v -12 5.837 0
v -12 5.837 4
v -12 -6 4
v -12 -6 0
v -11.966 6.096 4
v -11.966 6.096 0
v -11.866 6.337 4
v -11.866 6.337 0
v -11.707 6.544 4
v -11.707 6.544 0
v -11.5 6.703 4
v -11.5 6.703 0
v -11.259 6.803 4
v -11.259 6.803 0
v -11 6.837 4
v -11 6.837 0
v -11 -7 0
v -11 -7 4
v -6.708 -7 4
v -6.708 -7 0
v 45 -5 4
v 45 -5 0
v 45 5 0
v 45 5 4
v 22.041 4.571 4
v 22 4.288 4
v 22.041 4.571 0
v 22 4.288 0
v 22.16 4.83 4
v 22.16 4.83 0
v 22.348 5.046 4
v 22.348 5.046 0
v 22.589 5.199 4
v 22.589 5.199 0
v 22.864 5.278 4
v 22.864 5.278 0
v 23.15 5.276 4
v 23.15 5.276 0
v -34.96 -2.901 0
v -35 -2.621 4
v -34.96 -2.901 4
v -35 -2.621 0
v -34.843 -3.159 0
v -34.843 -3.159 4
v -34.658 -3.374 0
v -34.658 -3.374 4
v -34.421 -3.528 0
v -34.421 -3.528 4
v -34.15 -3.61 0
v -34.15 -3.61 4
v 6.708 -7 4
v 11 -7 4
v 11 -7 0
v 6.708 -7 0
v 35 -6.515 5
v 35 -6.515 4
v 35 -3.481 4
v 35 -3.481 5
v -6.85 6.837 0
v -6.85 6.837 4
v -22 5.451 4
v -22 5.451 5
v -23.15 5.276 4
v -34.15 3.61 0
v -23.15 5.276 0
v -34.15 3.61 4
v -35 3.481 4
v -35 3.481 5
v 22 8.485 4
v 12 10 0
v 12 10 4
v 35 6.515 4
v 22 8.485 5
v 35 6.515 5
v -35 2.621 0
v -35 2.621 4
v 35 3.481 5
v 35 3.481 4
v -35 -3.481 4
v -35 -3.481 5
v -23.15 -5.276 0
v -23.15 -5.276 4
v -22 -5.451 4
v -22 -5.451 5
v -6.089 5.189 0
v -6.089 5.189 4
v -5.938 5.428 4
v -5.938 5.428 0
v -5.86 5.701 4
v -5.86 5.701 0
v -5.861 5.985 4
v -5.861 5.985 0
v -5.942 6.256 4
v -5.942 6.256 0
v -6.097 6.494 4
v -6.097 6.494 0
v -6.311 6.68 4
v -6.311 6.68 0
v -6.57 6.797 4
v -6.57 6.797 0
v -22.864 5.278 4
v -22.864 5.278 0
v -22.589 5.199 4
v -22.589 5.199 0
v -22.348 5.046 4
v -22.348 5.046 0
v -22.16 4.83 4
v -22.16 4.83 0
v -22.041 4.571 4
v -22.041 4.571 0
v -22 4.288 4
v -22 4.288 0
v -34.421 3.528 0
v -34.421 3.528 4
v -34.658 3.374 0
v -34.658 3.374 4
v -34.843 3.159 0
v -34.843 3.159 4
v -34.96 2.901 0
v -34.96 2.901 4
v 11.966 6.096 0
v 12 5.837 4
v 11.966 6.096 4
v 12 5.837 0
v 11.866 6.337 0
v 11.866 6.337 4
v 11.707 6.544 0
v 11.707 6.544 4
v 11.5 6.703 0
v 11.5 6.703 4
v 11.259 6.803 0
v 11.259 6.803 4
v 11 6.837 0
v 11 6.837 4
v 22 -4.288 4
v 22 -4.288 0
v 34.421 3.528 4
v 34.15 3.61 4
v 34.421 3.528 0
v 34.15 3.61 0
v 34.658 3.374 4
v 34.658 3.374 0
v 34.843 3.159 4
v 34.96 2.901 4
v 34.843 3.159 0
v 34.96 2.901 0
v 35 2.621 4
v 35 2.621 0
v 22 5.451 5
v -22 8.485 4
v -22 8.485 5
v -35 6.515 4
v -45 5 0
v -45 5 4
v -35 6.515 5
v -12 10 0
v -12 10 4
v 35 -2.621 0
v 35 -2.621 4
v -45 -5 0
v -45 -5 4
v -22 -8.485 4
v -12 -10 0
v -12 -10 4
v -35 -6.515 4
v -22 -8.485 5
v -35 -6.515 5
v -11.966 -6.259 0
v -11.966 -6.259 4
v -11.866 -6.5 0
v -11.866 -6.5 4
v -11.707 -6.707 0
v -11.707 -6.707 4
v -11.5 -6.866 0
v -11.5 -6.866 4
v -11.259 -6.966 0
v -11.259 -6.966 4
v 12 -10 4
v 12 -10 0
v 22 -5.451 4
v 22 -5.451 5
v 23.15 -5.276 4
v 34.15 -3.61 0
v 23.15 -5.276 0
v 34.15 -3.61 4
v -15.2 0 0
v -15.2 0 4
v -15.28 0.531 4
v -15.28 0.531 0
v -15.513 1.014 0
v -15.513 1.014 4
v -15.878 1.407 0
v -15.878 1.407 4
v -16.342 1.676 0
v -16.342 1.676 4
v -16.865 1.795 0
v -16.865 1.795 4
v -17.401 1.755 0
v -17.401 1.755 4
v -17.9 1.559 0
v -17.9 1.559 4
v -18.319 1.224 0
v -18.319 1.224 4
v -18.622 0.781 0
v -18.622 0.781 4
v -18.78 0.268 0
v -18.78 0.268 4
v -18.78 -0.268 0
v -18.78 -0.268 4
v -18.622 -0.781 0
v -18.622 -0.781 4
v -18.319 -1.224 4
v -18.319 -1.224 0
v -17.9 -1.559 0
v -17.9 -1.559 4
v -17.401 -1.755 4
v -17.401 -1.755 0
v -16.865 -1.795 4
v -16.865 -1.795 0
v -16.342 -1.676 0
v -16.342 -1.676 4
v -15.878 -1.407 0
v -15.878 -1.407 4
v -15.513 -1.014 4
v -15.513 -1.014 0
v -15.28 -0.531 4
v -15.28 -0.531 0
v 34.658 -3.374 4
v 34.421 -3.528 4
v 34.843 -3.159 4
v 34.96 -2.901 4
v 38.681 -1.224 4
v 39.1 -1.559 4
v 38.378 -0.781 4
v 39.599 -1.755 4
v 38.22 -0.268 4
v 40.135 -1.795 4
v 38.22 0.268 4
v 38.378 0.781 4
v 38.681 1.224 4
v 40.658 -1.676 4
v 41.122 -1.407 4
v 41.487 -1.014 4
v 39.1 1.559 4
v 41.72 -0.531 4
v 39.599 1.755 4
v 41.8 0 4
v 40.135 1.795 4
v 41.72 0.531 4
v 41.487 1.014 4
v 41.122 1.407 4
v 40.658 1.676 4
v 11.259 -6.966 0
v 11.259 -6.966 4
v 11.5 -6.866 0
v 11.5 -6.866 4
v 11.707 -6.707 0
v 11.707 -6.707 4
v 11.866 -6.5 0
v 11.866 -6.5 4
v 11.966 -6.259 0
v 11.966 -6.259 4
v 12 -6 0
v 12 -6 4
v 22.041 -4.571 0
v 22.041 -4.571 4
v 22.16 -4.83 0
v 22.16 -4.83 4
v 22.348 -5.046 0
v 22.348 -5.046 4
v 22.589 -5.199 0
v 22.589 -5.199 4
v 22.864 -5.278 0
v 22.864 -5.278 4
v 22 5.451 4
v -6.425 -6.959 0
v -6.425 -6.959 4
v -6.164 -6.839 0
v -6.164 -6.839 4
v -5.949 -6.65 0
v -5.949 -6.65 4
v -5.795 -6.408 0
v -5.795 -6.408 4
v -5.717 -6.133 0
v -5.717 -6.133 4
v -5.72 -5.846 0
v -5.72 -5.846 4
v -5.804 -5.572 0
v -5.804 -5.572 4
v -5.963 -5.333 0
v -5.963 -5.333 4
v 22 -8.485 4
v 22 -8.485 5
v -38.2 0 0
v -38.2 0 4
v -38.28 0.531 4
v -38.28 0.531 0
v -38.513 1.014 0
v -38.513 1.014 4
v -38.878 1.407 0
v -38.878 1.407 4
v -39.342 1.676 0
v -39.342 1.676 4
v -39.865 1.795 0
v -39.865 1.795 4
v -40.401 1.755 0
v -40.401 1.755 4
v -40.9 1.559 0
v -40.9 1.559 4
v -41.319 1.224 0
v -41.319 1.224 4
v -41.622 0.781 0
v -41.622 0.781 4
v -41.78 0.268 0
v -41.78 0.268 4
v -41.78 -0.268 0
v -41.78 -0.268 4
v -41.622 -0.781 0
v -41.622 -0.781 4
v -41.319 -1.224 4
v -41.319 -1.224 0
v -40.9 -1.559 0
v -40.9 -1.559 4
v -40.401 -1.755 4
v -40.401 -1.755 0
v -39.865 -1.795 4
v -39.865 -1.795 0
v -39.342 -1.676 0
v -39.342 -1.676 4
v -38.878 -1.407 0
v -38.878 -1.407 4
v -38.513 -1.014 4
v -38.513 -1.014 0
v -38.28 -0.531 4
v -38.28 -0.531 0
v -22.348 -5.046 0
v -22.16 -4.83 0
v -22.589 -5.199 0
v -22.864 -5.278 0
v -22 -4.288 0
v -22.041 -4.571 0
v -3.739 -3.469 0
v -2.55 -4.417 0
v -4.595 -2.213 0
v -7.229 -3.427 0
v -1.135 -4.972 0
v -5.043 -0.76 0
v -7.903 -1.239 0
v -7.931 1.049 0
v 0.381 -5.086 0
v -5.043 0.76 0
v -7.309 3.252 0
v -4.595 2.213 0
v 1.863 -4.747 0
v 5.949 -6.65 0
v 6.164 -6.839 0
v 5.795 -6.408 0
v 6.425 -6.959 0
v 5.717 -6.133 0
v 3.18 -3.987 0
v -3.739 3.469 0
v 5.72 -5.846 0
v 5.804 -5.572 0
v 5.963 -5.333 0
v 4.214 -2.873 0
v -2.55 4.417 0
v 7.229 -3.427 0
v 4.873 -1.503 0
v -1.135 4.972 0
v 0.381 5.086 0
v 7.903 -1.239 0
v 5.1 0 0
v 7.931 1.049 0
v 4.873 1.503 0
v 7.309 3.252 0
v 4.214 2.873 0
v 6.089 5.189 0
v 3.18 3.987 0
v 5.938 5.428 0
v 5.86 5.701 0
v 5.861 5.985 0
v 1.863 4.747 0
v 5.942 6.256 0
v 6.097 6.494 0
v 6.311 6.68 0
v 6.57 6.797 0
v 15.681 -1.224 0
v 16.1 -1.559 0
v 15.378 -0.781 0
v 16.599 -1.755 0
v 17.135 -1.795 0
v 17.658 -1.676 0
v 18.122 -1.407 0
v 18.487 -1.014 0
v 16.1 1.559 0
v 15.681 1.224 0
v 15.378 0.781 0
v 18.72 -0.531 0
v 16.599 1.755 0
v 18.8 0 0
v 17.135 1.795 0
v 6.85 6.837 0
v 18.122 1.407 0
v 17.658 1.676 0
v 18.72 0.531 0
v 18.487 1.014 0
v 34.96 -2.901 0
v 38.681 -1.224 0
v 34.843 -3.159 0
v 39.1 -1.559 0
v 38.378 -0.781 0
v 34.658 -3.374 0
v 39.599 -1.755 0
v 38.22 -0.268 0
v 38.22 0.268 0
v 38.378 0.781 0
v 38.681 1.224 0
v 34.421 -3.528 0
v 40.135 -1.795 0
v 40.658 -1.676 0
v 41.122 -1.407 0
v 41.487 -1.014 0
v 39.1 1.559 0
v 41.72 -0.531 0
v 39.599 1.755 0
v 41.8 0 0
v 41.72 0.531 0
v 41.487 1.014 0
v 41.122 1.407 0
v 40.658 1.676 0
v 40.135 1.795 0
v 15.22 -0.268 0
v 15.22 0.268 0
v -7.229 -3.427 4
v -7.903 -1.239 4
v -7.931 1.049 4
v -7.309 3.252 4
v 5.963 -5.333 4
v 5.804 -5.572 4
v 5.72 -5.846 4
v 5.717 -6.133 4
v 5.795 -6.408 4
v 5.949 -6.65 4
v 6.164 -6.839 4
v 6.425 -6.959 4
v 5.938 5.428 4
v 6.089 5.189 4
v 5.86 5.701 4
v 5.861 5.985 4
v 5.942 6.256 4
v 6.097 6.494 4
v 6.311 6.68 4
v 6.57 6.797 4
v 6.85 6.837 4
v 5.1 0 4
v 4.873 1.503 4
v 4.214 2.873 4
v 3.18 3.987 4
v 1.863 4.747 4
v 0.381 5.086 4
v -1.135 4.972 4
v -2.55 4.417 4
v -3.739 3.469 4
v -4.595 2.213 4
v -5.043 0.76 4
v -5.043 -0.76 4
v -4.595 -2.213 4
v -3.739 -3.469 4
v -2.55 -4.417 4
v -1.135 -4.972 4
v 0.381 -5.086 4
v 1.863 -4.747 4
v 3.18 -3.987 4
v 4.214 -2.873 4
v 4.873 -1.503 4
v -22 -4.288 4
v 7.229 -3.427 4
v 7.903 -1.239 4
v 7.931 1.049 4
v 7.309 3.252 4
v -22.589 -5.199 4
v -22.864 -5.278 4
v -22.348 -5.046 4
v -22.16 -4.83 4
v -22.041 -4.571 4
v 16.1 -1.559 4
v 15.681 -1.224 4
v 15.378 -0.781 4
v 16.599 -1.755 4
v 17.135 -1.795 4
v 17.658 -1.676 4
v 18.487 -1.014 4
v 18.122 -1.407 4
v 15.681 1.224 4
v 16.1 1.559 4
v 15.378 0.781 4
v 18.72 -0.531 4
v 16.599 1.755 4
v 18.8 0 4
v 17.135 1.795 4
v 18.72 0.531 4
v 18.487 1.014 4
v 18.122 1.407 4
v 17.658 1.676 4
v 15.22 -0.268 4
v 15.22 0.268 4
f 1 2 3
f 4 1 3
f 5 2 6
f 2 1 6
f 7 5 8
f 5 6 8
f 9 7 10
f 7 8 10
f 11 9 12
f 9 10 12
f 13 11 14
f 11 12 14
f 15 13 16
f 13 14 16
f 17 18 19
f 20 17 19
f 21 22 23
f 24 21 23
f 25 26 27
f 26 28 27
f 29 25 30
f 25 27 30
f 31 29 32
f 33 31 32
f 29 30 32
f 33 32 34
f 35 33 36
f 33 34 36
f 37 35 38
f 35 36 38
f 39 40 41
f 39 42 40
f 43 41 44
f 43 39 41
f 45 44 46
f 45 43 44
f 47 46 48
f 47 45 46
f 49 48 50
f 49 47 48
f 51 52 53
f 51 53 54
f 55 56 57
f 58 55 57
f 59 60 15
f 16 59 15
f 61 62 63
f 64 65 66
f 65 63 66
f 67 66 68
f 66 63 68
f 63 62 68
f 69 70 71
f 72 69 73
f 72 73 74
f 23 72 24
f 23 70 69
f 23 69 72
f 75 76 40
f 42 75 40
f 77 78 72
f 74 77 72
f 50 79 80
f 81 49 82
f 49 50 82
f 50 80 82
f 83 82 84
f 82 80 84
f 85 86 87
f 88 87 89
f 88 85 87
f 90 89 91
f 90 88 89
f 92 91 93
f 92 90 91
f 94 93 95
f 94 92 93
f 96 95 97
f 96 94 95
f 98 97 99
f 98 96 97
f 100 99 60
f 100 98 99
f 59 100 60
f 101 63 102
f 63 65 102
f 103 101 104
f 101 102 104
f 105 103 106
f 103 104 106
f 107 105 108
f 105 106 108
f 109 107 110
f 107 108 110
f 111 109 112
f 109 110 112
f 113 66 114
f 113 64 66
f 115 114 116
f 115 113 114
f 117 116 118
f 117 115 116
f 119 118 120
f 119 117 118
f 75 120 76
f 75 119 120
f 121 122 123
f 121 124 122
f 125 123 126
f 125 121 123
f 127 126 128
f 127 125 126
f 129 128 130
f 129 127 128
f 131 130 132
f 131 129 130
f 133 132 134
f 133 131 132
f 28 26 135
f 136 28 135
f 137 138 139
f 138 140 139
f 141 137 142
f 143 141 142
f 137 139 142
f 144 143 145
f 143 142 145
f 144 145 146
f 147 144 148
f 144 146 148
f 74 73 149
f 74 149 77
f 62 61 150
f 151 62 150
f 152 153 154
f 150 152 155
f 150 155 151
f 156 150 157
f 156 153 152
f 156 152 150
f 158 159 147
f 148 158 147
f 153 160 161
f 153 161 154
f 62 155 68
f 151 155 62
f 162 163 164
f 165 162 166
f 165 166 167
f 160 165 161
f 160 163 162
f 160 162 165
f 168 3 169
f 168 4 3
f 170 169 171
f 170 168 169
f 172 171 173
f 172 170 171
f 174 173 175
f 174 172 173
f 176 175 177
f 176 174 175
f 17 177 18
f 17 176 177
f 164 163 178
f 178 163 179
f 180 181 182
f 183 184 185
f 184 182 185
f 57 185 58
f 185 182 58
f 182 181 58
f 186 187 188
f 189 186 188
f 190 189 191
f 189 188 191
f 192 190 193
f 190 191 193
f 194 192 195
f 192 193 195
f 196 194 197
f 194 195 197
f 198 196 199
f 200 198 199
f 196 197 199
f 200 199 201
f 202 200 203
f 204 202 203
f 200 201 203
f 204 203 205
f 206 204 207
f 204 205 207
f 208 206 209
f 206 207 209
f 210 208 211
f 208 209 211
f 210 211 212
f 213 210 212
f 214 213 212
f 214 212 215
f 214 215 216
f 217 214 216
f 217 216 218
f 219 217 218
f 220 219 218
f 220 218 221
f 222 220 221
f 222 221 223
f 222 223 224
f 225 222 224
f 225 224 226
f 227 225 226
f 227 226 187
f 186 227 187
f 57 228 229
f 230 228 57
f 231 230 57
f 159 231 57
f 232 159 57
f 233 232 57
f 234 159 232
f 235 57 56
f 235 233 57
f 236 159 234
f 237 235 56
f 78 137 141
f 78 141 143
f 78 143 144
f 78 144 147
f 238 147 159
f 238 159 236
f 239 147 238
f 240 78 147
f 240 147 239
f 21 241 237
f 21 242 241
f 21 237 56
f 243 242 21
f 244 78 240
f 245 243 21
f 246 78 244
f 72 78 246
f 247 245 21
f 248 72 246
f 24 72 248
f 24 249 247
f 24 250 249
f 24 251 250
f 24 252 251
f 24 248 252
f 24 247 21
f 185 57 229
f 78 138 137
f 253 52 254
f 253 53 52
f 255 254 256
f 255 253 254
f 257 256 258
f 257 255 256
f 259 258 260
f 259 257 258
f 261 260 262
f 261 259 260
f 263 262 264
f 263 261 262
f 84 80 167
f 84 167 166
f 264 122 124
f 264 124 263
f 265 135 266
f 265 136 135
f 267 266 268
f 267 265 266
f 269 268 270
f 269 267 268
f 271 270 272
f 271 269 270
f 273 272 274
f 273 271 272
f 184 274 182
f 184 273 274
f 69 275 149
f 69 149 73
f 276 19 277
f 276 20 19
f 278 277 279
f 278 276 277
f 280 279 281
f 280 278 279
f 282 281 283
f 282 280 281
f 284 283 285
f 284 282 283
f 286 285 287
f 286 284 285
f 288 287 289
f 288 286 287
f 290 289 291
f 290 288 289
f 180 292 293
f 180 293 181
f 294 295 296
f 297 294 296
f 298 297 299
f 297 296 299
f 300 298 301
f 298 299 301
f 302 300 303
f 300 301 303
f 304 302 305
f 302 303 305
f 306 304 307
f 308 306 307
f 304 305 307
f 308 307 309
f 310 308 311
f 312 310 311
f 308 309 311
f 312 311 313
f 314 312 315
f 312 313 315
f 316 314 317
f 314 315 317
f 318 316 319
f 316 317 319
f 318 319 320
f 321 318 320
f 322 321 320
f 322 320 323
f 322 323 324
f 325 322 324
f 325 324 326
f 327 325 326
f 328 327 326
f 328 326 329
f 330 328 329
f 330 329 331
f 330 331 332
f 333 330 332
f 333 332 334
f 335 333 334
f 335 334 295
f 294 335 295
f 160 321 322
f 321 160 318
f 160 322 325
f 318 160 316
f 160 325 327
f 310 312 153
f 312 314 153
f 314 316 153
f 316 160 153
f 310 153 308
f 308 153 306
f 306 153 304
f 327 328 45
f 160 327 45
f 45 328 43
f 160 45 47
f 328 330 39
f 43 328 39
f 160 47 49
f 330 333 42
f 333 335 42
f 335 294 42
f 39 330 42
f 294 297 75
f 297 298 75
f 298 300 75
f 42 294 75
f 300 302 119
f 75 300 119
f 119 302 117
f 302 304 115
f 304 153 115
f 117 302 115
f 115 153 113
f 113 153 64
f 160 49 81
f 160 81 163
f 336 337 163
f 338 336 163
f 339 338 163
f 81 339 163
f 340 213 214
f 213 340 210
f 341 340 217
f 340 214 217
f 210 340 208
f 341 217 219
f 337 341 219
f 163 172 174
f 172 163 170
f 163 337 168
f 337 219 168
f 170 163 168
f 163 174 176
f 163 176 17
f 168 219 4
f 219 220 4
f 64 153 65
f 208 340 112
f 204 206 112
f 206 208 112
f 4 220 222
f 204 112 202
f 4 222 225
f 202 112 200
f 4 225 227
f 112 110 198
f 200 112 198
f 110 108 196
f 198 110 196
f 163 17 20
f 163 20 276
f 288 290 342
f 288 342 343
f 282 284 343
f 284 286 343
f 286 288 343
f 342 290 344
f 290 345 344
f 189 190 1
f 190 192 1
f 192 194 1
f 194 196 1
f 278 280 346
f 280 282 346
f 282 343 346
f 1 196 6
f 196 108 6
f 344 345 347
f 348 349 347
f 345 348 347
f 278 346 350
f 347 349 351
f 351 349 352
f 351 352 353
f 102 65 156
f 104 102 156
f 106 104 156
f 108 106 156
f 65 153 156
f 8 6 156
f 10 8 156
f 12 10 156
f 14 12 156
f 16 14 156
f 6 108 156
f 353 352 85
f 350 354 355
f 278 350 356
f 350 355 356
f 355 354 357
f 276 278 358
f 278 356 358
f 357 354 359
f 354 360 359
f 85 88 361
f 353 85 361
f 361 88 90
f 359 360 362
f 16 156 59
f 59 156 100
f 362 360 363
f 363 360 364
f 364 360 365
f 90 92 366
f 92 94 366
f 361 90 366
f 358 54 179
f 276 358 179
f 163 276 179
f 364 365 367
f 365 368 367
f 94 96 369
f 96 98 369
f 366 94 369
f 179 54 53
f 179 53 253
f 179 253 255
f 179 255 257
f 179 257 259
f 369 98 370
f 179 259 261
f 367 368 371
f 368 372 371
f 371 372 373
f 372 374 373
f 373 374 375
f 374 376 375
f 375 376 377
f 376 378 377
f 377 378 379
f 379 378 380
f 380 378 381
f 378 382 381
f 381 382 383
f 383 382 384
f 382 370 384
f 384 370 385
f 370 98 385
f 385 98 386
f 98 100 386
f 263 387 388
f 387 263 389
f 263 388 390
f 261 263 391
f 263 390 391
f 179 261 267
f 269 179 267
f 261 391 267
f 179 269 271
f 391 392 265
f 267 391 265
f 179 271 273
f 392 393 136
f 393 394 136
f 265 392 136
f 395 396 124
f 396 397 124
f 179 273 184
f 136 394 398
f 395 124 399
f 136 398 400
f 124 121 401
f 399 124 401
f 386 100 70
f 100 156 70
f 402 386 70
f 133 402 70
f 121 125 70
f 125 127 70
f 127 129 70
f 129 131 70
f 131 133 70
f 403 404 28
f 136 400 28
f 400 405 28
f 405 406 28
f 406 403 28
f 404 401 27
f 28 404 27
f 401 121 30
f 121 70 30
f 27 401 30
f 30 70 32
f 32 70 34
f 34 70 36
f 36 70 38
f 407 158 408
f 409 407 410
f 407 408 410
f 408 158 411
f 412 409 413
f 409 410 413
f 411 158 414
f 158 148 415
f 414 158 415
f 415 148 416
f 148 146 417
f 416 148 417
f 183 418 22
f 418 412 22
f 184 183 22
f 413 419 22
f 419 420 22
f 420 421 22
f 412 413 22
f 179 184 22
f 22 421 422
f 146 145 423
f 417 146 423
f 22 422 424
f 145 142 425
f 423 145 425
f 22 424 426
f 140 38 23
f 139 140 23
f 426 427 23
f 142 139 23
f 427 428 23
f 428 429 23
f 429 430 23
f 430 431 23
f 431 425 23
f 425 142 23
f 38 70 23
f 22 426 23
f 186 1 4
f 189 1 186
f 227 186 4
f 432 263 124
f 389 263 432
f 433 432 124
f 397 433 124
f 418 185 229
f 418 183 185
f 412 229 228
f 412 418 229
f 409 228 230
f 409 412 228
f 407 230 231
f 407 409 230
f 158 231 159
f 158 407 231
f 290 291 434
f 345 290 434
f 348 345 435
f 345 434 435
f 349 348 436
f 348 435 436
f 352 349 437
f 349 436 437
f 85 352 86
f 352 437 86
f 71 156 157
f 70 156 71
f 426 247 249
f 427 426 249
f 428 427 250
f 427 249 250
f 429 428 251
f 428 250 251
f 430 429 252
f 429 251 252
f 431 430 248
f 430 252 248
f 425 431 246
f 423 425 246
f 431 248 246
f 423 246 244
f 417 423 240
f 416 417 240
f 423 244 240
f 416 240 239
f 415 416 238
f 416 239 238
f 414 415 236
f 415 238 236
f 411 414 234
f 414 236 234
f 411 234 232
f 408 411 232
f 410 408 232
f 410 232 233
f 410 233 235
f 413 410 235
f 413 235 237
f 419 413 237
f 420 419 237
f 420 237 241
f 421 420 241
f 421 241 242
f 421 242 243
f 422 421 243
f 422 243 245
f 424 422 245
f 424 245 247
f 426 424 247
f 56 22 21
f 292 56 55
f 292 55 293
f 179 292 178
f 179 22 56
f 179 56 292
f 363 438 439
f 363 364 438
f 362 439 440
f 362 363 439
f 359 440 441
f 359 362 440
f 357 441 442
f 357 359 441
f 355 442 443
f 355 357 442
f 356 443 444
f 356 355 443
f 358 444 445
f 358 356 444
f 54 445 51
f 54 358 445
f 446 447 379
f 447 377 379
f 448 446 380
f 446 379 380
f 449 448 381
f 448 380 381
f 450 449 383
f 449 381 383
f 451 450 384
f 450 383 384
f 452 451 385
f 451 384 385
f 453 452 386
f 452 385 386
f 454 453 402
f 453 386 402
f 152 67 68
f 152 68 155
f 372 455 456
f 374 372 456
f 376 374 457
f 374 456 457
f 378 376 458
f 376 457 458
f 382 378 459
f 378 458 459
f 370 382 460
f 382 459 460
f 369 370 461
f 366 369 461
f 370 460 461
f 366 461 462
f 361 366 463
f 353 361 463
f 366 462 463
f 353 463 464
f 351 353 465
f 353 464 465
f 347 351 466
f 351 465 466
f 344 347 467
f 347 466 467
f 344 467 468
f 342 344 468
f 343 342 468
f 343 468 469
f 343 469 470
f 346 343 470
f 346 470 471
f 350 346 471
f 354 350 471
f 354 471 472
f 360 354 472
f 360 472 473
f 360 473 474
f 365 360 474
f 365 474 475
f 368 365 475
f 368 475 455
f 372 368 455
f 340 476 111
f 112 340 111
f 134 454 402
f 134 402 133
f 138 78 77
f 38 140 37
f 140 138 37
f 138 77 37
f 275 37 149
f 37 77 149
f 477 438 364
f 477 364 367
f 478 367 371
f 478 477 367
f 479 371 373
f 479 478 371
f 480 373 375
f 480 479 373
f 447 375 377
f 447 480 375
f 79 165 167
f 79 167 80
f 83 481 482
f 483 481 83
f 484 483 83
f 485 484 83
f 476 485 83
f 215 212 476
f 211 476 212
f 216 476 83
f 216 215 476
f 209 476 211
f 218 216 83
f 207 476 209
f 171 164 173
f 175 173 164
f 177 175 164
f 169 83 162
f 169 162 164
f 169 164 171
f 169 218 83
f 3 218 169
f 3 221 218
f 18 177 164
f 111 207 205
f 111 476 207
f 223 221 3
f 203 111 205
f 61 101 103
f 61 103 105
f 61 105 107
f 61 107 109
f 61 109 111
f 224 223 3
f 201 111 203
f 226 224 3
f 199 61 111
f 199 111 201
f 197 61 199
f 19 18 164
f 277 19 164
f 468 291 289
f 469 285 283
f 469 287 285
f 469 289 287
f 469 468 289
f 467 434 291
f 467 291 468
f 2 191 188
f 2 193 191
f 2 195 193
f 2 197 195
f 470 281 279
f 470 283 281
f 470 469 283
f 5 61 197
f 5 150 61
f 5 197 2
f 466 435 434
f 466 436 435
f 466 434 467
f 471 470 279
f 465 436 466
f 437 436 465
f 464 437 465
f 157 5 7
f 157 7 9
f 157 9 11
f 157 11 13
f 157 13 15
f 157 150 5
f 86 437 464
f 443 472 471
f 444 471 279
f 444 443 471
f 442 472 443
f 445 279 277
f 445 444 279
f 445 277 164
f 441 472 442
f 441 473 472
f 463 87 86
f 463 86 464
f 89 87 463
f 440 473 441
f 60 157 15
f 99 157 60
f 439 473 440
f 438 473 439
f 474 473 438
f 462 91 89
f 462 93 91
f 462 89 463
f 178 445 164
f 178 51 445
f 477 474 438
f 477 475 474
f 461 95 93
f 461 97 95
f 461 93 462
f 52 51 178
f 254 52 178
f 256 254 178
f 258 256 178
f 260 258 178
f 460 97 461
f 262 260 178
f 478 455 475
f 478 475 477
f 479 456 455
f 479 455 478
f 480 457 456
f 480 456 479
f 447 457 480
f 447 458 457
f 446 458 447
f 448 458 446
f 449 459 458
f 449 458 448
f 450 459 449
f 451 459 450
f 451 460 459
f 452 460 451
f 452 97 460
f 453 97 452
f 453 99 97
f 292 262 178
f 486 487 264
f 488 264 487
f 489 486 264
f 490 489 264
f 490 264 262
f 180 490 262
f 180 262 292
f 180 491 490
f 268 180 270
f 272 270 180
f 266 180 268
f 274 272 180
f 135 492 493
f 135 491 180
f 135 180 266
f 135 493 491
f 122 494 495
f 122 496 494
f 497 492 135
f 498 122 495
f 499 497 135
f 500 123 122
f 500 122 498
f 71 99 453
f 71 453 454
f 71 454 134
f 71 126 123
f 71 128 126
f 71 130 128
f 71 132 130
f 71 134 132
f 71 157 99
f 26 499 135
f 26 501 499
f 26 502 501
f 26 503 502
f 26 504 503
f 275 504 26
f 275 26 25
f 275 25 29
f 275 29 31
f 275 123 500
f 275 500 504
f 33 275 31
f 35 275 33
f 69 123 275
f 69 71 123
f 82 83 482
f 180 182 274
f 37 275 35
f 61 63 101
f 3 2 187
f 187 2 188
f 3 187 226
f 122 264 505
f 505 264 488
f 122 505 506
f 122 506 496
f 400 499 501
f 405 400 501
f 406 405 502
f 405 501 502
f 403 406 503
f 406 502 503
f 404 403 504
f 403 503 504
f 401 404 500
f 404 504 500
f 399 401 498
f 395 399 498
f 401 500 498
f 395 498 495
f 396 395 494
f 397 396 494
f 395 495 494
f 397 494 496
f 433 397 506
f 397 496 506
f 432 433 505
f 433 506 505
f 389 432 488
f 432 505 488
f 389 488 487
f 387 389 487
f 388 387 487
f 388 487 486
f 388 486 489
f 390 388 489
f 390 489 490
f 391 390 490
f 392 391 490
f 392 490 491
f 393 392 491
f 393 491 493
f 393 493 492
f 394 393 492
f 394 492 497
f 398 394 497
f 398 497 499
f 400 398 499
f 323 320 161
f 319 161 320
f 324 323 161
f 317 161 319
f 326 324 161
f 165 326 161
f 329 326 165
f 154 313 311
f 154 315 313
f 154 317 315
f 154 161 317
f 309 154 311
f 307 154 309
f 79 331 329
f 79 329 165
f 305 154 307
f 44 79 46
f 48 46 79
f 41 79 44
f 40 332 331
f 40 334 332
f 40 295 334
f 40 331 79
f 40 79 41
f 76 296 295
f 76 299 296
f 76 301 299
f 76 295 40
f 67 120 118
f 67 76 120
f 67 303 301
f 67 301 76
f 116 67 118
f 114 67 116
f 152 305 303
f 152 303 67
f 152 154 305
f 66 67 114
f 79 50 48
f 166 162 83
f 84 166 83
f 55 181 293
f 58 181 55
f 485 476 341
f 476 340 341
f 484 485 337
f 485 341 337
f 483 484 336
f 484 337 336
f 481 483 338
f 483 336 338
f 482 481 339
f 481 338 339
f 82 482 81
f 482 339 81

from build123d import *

# Parameters (mm, degrees)
SKETCH_1_W          = 90
SKETCH_1_H          = 20
EXTRUDE_1_DEPTH     = 4
SKETCH_2_W          = 13
SKETCH_2_H          = 20
EXTRUDE_2_DEPTH     = 1
SKETCH_4_R          = 5.1
EXTRUDE_3_DEPTH     = 4
SKETCH_3_R          = 1.8
CUT_EXTRUDE_1_DEPTH = 47.270941205
SKETCH_4_3_R        = 5.1
CUT_EXTRUDE_3_DEPTH = 47.270941205
SKETCH_7_OUTSIDE_W  = 110.466
SKETCH_7_OUTSIDE_H  = 40.466
CUT_EXTRUDE_6_DEPTH = 10
CUT_EXTRUDE_7_DEPTH = 47.368092477
CUT_EXTRUDE_8_DEPTH = 47.270941205
FILLET_1_R          = 1


with BuildPart() as part:
    # ｽｹｯﾁ1 → ﾎﾞｽ - 押し出し1 (new body)
    with BuildSketch(Plane.XY):
        Rectangle(SKETCH_1_W, SKETCH_1_H)
    extrude(amount=EXTRUDE_1_DEPTH)

    # ｽｹｯﾁ2 → ﾎﾞｽ - 押し出し2 (add)
    with BuildSketch(Plane.XY.offset(4)):
        with Locations((-28.5, 0)):
            Rectangle(SKETCH_2_W, SKETCH_2_H)
        with Locations((28.5, 0)):
            Rectangle(SKETCH_2_W, SKETCH_2_H)
    extrude(amount=EXTRUDE_2_DEPTH)

    # ｽｹｯﾁ4 → ﾎﾞｽ - 押し出し3 (add)
    with BuildSketch(Plane.XY.offset(4)):
        Circle(SKETCH_4_R)
    extrude(amount=-EXTRUDE_3_DEPTH)

    # ｽｹｯﾁ3 → ｶｯﾄ - 押し出し1 (cut, through all)
    with BuildSketch(Plane.XY.offset(4)):
        with Locations((-40, 0)):
            Circle(SKETCH_3_R)
        with Locations((-17, 0)):
            Circle(SKETCH_3_R)
        with Locations((17, 0)):
            Circle(SKETCH_3_R)
        with Locations((40, 0)):
            Circle(SKETCH_3_R)
    extrude(amount=-CUT_EXTRUDE_1_DEPTH, mode=Mode.SUBTRACT)

    # ｽｹｯﾁ4<3> → ｶｯﾄ - 押し出し3 (cut, through all)
    with BuildSketch(Plane.XY.offset(4)):
        Circle(SKETCH_4_3_R)
    extrude(amount=-CUT_EXTRUDE_3_DEPTH, mode=Mode.SUBTRACT)

    # ｽｹｯﾁ7 outside → ｶｯﾄ - 押し出し6 (cut)
    with BuildSketch(Plane(origin=(0, 0, 0), x_dir=(-1, 0, 0), z_dir=(0, 0, -1))):
        Rectangle(SKETCH_7_OUTSIDE_W, SKETCH_7_OUTSIDE_H)
        Polygon((-45, 5), (-45, -5), (-12, -10), (12, -10), (45, -5), (45, 5), (12, 10), (-12, 10), align=None, mode=Mode.SUBTRACT)
    extrude(amount=-CUT_EXTRUDE_6_DEPTH, mode=Mode.SUBTRACT)

    # ｽｹｯﾁ8 → ｶｯﾄ - 押し出し7 (cut, through all)
    with BuildSketch(Plane.XY.offset(5)):
        Polygon((22, 5.450608618), (22, -5.450608618), (35, -3.480911648), (35, 3.480911648), align=None)
        Polygon((-22, 5.450608618), (-35, 3.480911648), (-35, -3.480911648), (-22, -5.450608618), align=None)
    extrude(amount=-CUT_EXTRUDE_7_DEPTH, mode=Mode.SUBTRACT)

    # ｽｹｯﾁ9 → ｶｯﾄ - 押し出し8 (cut, through all)
    with BuildSketch(Plane.XY.offset(4)):
        with BuildLine():
            Line((-12, 6.837276926), (-12, -7))
            Line((-12, -7), (-3.872983346, -7))
            ThreePointArc((-3.872983346, -7), (-7.998356489, -0.162152651), (-4.153509869, 6.837276926))
            Line((-4.153509869, 6.837276926), (-12, 6.837276926))
        make_face()
        with BuildLine():
            Line((4.153509869, 6.837276926), (12, 6.837276926))
            Line((12, 6.837276926), (12, -7))
            Line((12, -7), (3.872983346, -7))
            ThreePointArc((3.872983346, -7), (7.998356489, -0.162152651), (4.153509869, 6.837276926))
        make_face()
    extrude(amount=-CUT_EXTRUDE_8_DEPTH, mode=Mode.SUBTRACT)

    # ﾌｨﾚｯﾄ1
    fillet_1_edges = [part.edges().sort_by_distance(p)[0] for p in [
        (22, 5.450608618, 2),
        (35, 3.480911648, 2),
        (35, -3.480911648, 2),
        (22, -5.450608618, 2),
        (-22, 5.450608618, 2),
        (-22, -5.450608618, 2),
        (-35, -3.480911648, 2),
        (-35, 3.480911648, 2),
        (-12, 6.837276926, 2),
        (-4.153509869, 6.837276926, 2),
        (-3.872983346, -7, 2),
        (-12, -7, 2),
        (12, -7, 2),
        (3.872983346, -7, 2),
        (4.153509869, 6.837276926, 2),
        (12, 6.837276926, 2),
    ]]
    fillet(fillet_1_edges, radius=FILLET_1_R)


solid = part.part
